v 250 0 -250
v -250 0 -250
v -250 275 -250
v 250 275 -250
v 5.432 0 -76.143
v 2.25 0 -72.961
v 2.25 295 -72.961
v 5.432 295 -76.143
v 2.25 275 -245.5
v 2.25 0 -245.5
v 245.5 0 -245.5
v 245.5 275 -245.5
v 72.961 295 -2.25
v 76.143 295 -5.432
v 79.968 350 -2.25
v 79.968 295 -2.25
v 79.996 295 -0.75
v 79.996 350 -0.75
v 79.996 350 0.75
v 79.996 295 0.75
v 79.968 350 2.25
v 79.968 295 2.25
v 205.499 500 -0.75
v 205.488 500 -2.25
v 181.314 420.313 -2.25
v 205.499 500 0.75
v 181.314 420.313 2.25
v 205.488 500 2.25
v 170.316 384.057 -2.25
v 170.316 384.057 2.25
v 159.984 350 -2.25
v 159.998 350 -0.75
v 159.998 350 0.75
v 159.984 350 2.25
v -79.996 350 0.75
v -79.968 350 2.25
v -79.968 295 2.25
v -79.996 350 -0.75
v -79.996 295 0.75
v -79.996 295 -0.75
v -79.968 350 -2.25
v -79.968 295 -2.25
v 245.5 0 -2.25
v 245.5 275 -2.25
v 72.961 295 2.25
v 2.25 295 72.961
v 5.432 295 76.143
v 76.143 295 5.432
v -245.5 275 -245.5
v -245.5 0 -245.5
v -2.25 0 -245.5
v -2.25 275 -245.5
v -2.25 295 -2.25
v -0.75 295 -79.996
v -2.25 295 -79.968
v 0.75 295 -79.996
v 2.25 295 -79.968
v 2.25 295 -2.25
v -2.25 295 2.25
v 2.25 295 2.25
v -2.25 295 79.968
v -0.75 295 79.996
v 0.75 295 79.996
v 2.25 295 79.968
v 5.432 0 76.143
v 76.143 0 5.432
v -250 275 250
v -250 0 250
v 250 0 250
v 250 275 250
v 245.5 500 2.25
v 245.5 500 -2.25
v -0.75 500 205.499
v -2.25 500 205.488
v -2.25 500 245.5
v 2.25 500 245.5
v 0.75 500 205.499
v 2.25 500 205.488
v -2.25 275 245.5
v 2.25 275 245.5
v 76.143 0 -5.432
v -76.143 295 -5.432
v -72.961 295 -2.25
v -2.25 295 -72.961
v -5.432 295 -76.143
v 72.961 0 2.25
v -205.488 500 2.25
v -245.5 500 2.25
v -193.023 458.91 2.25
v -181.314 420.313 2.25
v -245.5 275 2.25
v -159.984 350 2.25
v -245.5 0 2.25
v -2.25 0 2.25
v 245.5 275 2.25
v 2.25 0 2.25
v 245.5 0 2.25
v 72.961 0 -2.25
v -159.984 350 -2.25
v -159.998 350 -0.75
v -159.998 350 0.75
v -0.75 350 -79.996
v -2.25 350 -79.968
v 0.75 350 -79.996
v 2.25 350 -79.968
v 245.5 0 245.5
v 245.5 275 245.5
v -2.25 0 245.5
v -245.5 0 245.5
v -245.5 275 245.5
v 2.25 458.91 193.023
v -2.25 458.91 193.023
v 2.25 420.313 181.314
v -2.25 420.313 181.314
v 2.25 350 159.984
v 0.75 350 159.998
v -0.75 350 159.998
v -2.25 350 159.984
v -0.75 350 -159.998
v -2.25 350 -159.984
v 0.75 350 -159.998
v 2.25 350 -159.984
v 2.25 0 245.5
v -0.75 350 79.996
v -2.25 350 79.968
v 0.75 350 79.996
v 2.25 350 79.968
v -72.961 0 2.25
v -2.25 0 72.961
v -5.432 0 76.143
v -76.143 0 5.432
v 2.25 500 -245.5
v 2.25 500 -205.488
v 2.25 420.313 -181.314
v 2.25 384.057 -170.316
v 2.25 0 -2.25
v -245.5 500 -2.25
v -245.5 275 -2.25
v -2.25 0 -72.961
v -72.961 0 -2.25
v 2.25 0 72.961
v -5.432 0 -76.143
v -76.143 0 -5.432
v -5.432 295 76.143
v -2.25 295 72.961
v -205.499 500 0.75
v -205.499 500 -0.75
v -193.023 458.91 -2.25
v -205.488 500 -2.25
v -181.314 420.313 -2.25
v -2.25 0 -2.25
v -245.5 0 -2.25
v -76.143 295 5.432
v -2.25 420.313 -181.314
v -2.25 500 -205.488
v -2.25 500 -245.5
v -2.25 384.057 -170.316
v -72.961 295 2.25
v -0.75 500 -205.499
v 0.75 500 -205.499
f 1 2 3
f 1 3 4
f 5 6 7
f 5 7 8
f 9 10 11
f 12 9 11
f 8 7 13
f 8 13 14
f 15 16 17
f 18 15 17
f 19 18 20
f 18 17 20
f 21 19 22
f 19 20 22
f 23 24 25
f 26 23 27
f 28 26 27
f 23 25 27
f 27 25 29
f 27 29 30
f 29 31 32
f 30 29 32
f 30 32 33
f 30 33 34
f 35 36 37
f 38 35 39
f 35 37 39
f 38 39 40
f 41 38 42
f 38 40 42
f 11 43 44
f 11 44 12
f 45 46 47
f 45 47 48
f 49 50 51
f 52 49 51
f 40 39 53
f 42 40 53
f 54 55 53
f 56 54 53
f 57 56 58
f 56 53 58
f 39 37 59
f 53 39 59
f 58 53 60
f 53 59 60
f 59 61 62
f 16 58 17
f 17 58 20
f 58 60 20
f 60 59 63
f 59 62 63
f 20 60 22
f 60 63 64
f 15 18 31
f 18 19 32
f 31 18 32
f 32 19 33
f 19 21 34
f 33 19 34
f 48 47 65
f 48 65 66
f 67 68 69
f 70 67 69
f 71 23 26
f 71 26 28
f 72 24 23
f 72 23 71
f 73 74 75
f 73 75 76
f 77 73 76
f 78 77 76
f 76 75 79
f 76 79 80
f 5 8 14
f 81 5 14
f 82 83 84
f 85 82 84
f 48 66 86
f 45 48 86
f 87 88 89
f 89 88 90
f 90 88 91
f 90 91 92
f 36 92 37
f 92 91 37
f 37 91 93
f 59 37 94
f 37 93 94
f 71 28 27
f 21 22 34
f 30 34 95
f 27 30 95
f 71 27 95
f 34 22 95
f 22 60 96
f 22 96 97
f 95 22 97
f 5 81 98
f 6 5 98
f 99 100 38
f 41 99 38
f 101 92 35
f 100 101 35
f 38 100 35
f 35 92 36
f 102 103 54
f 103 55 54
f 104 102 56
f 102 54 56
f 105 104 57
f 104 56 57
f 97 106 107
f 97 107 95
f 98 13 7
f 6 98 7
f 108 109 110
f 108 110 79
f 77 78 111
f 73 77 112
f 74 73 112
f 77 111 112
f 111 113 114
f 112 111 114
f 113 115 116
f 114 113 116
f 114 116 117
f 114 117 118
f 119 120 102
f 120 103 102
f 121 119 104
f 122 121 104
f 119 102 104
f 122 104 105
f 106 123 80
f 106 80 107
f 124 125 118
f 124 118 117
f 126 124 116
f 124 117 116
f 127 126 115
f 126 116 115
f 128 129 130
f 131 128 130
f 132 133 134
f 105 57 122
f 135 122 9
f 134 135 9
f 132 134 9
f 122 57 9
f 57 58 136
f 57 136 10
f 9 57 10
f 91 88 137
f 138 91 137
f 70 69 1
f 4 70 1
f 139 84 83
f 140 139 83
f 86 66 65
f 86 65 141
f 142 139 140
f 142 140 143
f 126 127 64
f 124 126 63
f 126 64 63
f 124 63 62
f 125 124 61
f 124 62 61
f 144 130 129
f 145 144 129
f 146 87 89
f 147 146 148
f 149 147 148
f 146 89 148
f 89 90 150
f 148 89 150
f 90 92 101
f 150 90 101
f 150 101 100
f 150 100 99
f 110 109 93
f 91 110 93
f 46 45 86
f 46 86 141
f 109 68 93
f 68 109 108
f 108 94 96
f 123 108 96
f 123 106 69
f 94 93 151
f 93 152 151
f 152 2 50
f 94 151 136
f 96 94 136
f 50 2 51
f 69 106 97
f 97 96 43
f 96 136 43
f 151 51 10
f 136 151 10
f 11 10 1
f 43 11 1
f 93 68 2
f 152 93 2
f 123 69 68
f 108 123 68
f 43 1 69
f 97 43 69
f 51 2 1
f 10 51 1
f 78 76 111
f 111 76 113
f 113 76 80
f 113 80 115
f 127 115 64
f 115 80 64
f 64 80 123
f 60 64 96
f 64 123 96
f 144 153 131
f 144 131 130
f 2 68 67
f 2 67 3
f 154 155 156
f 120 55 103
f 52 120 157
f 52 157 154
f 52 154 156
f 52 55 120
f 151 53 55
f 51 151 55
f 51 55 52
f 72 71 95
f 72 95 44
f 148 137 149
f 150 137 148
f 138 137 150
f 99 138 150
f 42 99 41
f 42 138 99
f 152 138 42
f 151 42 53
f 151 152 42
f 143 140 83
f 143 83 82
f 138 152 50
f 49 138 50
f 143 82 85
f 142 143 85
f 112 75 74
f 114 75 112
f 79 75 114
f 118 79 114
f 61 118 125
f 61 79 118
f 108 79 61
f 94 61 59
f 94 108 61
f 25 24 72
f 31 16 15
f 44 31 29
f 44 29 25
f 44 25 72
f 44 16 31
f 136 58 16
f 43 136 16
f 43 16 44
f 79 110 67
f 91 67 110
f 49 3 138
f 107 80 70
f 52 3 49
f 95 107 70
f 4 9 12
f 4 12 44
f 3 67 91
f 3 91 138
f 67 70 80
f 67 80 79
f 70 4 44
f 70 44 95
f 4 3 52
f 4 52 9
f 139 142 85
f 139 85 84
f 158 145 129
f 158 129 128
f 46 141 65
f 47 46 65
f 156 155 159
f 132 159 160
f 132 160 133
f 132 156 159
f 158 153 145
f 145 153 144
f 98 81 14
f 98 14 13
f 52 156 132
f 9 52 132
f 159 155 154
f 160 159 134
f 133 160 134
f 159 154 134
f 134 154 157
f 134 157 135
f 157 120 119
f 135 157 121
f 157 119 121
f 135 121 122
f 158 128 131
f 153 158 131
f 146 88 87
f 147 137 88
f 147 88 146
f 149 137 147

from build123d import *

# Parameters (mm, degrees)
SKETCH1_W             = 500
SKETCH1_H             = 500
SKETCH1_W_2           = 243.25
SKETCH1_H_2           = 243.25
BOSS_EXTRUDE1_DEPTH   = 500
BOSS_EXTRUDE3_DEPTH   = 500
BOSS_EXTRUDE3_2_DEPTH = 500
SKETCH8_W             = 500
SKETCH8_H             = 500
SKETCH8_W_2           = 491
SKETCH8_H_2           = 491
CUT_EXTRUDE1_DEPTH    = 225


with BuildPart() as part:
    # Sketch1 → Boss-Extrude1 (new body)
    with BuildSketch(Plane(origin=(0, 0, 0), x_dir=(1, 0, 0), z_dir=(0, 1, 0))):
        Rectangle(SKETCH1_W, SKETCH1_H)
        with Locations((-123.875, 123.875)):
            Rectangle(SKETCH1_W_2, SKETCH1_H_2, mode=Mode.SUBTRACT)
        with Locations((123.875, 123.875)):
            Rectangle(SKETCH1_W_2, SKETCH1_H_2, mode=Mode.SUBTRACT)
        with Locations((-123.875, -123.875)):
            Rectangle(SKETCH1_W_2, SKETCH1_H_2, mode=Mode.SUBTRACT)
        with Locations((123.875, -123.875)):
            Rectangle(SKETCH1_W_2, SKETCH1_H_2, mode=Mode.SUBTRACT)
    extrude(amount=BOSS_EXTRUDE1_DEPTH)

    # Sketch8 → Cut-Extrude1 (cut)
    with BuildSketch(Plane(origin=(0, 500, 0), x_dir=(1, 0, 0), z_dir=(0, 1, 0))):
        Rectangle(SKETCH8_W, SKETCH8_H)
        Rectangle(SKETCH8_W_2, SKETCH8_H_2, mode=Mode.SUBTRACT)
    extrude(amount=-CUT_EXTRUDE1_DEPTH, mode=Mode.SUBTRACT)


with BuildPart() as body_2:
    # Sketch4 → Boss-Extrude3 (new body)
    with BuildSketch(Plane(origin=(0, 500, 0), x_dir=(1, 0, 0), z_dir=(0, 1, 0))):
        Polygon((5.431980515, 76.142658634), (76.142658634, 5.431980515), (72.960678119, 2.25), (2.25, 72.960678119), align=None)
    extrude(amount=-BOSS_EXTRUDE3_DEPTH)


with BuildPart() as body_3:
    # Sketch4 → Boss-Extrude3 2 (new body)
    with BuildSketch(Plane(origin=(0, 500, 0), x_dir=(1, 0, 0), z_dir=(0, 1, 0))):
        Polygon((-76.142658634, 5.431980515), (-5.431980515, 76.142658634), (-2.25, 72.960678119), (-72.960678119, 2.25), align=None)
    extrude(amount=-BOSS_EXTRUDE3_2_DEPTH)


with BuildPart() as body_4:
    # Mirror2: mirrored copy
    add(body_3.part.mirror(Plane.XY))


with BuildPart() as body_5:
    # Mirror2 2: mirrored copy
    add(body_2.part.mirror(Plane.XY))


with BuildPart() as cut_revolve3_tool:
    # Sketch11 → Cut-Revolve3 (revolve)
    with BuildSketch(Plane.XY):
        Polygon((205.5, 500), (160, 350), (80, 350), (80, 295), (0, 295), (0, 500), align=None)
    revolve(axis=Axis((0, 500, 0), (0, -1, 0)))


with BuildPart() as part_1:
    add(part.part)

    # Cut-Revolve3: cut by cut_revolve3_tool
    add(cut_revolve3_tool.part, mode=Mode.SUBTRACT)


with BuildPart() as body_2_1:
    add(body_2.part)

    # Cut-Revolve3: cut by cut_revolve3_tool
    add(cut_revolve3_tool.part, mode=Mode.SUBTRACT)


with BuildPart() as body_3_1:
    add(body_3.part)

    # Cut-Revolve3: cut by cut_revolve3_tool
    add(cut_revolve3_tool.part, mode=Mode.SUBTRACT)


with BuildPart() as body_4_1:
    add(body_4.part)

    # Cut-Revolve3: cut by cut_revolve3_tool
    add(cut_revolve3_tool.part, mode=Mode.SUBTRACT)


with BuildPart() as body_5_1:
    add(body_5.part)

    # Cut-Revolve3: cut by cut_revolve3_tool
    add(cut_revolve3_tool.part, mode=Mode.SUBTRACT)


solid = Compound([part_1.part, body_2_1.part, body_3_1.part, body_4_1.part, body_5_1.part])
